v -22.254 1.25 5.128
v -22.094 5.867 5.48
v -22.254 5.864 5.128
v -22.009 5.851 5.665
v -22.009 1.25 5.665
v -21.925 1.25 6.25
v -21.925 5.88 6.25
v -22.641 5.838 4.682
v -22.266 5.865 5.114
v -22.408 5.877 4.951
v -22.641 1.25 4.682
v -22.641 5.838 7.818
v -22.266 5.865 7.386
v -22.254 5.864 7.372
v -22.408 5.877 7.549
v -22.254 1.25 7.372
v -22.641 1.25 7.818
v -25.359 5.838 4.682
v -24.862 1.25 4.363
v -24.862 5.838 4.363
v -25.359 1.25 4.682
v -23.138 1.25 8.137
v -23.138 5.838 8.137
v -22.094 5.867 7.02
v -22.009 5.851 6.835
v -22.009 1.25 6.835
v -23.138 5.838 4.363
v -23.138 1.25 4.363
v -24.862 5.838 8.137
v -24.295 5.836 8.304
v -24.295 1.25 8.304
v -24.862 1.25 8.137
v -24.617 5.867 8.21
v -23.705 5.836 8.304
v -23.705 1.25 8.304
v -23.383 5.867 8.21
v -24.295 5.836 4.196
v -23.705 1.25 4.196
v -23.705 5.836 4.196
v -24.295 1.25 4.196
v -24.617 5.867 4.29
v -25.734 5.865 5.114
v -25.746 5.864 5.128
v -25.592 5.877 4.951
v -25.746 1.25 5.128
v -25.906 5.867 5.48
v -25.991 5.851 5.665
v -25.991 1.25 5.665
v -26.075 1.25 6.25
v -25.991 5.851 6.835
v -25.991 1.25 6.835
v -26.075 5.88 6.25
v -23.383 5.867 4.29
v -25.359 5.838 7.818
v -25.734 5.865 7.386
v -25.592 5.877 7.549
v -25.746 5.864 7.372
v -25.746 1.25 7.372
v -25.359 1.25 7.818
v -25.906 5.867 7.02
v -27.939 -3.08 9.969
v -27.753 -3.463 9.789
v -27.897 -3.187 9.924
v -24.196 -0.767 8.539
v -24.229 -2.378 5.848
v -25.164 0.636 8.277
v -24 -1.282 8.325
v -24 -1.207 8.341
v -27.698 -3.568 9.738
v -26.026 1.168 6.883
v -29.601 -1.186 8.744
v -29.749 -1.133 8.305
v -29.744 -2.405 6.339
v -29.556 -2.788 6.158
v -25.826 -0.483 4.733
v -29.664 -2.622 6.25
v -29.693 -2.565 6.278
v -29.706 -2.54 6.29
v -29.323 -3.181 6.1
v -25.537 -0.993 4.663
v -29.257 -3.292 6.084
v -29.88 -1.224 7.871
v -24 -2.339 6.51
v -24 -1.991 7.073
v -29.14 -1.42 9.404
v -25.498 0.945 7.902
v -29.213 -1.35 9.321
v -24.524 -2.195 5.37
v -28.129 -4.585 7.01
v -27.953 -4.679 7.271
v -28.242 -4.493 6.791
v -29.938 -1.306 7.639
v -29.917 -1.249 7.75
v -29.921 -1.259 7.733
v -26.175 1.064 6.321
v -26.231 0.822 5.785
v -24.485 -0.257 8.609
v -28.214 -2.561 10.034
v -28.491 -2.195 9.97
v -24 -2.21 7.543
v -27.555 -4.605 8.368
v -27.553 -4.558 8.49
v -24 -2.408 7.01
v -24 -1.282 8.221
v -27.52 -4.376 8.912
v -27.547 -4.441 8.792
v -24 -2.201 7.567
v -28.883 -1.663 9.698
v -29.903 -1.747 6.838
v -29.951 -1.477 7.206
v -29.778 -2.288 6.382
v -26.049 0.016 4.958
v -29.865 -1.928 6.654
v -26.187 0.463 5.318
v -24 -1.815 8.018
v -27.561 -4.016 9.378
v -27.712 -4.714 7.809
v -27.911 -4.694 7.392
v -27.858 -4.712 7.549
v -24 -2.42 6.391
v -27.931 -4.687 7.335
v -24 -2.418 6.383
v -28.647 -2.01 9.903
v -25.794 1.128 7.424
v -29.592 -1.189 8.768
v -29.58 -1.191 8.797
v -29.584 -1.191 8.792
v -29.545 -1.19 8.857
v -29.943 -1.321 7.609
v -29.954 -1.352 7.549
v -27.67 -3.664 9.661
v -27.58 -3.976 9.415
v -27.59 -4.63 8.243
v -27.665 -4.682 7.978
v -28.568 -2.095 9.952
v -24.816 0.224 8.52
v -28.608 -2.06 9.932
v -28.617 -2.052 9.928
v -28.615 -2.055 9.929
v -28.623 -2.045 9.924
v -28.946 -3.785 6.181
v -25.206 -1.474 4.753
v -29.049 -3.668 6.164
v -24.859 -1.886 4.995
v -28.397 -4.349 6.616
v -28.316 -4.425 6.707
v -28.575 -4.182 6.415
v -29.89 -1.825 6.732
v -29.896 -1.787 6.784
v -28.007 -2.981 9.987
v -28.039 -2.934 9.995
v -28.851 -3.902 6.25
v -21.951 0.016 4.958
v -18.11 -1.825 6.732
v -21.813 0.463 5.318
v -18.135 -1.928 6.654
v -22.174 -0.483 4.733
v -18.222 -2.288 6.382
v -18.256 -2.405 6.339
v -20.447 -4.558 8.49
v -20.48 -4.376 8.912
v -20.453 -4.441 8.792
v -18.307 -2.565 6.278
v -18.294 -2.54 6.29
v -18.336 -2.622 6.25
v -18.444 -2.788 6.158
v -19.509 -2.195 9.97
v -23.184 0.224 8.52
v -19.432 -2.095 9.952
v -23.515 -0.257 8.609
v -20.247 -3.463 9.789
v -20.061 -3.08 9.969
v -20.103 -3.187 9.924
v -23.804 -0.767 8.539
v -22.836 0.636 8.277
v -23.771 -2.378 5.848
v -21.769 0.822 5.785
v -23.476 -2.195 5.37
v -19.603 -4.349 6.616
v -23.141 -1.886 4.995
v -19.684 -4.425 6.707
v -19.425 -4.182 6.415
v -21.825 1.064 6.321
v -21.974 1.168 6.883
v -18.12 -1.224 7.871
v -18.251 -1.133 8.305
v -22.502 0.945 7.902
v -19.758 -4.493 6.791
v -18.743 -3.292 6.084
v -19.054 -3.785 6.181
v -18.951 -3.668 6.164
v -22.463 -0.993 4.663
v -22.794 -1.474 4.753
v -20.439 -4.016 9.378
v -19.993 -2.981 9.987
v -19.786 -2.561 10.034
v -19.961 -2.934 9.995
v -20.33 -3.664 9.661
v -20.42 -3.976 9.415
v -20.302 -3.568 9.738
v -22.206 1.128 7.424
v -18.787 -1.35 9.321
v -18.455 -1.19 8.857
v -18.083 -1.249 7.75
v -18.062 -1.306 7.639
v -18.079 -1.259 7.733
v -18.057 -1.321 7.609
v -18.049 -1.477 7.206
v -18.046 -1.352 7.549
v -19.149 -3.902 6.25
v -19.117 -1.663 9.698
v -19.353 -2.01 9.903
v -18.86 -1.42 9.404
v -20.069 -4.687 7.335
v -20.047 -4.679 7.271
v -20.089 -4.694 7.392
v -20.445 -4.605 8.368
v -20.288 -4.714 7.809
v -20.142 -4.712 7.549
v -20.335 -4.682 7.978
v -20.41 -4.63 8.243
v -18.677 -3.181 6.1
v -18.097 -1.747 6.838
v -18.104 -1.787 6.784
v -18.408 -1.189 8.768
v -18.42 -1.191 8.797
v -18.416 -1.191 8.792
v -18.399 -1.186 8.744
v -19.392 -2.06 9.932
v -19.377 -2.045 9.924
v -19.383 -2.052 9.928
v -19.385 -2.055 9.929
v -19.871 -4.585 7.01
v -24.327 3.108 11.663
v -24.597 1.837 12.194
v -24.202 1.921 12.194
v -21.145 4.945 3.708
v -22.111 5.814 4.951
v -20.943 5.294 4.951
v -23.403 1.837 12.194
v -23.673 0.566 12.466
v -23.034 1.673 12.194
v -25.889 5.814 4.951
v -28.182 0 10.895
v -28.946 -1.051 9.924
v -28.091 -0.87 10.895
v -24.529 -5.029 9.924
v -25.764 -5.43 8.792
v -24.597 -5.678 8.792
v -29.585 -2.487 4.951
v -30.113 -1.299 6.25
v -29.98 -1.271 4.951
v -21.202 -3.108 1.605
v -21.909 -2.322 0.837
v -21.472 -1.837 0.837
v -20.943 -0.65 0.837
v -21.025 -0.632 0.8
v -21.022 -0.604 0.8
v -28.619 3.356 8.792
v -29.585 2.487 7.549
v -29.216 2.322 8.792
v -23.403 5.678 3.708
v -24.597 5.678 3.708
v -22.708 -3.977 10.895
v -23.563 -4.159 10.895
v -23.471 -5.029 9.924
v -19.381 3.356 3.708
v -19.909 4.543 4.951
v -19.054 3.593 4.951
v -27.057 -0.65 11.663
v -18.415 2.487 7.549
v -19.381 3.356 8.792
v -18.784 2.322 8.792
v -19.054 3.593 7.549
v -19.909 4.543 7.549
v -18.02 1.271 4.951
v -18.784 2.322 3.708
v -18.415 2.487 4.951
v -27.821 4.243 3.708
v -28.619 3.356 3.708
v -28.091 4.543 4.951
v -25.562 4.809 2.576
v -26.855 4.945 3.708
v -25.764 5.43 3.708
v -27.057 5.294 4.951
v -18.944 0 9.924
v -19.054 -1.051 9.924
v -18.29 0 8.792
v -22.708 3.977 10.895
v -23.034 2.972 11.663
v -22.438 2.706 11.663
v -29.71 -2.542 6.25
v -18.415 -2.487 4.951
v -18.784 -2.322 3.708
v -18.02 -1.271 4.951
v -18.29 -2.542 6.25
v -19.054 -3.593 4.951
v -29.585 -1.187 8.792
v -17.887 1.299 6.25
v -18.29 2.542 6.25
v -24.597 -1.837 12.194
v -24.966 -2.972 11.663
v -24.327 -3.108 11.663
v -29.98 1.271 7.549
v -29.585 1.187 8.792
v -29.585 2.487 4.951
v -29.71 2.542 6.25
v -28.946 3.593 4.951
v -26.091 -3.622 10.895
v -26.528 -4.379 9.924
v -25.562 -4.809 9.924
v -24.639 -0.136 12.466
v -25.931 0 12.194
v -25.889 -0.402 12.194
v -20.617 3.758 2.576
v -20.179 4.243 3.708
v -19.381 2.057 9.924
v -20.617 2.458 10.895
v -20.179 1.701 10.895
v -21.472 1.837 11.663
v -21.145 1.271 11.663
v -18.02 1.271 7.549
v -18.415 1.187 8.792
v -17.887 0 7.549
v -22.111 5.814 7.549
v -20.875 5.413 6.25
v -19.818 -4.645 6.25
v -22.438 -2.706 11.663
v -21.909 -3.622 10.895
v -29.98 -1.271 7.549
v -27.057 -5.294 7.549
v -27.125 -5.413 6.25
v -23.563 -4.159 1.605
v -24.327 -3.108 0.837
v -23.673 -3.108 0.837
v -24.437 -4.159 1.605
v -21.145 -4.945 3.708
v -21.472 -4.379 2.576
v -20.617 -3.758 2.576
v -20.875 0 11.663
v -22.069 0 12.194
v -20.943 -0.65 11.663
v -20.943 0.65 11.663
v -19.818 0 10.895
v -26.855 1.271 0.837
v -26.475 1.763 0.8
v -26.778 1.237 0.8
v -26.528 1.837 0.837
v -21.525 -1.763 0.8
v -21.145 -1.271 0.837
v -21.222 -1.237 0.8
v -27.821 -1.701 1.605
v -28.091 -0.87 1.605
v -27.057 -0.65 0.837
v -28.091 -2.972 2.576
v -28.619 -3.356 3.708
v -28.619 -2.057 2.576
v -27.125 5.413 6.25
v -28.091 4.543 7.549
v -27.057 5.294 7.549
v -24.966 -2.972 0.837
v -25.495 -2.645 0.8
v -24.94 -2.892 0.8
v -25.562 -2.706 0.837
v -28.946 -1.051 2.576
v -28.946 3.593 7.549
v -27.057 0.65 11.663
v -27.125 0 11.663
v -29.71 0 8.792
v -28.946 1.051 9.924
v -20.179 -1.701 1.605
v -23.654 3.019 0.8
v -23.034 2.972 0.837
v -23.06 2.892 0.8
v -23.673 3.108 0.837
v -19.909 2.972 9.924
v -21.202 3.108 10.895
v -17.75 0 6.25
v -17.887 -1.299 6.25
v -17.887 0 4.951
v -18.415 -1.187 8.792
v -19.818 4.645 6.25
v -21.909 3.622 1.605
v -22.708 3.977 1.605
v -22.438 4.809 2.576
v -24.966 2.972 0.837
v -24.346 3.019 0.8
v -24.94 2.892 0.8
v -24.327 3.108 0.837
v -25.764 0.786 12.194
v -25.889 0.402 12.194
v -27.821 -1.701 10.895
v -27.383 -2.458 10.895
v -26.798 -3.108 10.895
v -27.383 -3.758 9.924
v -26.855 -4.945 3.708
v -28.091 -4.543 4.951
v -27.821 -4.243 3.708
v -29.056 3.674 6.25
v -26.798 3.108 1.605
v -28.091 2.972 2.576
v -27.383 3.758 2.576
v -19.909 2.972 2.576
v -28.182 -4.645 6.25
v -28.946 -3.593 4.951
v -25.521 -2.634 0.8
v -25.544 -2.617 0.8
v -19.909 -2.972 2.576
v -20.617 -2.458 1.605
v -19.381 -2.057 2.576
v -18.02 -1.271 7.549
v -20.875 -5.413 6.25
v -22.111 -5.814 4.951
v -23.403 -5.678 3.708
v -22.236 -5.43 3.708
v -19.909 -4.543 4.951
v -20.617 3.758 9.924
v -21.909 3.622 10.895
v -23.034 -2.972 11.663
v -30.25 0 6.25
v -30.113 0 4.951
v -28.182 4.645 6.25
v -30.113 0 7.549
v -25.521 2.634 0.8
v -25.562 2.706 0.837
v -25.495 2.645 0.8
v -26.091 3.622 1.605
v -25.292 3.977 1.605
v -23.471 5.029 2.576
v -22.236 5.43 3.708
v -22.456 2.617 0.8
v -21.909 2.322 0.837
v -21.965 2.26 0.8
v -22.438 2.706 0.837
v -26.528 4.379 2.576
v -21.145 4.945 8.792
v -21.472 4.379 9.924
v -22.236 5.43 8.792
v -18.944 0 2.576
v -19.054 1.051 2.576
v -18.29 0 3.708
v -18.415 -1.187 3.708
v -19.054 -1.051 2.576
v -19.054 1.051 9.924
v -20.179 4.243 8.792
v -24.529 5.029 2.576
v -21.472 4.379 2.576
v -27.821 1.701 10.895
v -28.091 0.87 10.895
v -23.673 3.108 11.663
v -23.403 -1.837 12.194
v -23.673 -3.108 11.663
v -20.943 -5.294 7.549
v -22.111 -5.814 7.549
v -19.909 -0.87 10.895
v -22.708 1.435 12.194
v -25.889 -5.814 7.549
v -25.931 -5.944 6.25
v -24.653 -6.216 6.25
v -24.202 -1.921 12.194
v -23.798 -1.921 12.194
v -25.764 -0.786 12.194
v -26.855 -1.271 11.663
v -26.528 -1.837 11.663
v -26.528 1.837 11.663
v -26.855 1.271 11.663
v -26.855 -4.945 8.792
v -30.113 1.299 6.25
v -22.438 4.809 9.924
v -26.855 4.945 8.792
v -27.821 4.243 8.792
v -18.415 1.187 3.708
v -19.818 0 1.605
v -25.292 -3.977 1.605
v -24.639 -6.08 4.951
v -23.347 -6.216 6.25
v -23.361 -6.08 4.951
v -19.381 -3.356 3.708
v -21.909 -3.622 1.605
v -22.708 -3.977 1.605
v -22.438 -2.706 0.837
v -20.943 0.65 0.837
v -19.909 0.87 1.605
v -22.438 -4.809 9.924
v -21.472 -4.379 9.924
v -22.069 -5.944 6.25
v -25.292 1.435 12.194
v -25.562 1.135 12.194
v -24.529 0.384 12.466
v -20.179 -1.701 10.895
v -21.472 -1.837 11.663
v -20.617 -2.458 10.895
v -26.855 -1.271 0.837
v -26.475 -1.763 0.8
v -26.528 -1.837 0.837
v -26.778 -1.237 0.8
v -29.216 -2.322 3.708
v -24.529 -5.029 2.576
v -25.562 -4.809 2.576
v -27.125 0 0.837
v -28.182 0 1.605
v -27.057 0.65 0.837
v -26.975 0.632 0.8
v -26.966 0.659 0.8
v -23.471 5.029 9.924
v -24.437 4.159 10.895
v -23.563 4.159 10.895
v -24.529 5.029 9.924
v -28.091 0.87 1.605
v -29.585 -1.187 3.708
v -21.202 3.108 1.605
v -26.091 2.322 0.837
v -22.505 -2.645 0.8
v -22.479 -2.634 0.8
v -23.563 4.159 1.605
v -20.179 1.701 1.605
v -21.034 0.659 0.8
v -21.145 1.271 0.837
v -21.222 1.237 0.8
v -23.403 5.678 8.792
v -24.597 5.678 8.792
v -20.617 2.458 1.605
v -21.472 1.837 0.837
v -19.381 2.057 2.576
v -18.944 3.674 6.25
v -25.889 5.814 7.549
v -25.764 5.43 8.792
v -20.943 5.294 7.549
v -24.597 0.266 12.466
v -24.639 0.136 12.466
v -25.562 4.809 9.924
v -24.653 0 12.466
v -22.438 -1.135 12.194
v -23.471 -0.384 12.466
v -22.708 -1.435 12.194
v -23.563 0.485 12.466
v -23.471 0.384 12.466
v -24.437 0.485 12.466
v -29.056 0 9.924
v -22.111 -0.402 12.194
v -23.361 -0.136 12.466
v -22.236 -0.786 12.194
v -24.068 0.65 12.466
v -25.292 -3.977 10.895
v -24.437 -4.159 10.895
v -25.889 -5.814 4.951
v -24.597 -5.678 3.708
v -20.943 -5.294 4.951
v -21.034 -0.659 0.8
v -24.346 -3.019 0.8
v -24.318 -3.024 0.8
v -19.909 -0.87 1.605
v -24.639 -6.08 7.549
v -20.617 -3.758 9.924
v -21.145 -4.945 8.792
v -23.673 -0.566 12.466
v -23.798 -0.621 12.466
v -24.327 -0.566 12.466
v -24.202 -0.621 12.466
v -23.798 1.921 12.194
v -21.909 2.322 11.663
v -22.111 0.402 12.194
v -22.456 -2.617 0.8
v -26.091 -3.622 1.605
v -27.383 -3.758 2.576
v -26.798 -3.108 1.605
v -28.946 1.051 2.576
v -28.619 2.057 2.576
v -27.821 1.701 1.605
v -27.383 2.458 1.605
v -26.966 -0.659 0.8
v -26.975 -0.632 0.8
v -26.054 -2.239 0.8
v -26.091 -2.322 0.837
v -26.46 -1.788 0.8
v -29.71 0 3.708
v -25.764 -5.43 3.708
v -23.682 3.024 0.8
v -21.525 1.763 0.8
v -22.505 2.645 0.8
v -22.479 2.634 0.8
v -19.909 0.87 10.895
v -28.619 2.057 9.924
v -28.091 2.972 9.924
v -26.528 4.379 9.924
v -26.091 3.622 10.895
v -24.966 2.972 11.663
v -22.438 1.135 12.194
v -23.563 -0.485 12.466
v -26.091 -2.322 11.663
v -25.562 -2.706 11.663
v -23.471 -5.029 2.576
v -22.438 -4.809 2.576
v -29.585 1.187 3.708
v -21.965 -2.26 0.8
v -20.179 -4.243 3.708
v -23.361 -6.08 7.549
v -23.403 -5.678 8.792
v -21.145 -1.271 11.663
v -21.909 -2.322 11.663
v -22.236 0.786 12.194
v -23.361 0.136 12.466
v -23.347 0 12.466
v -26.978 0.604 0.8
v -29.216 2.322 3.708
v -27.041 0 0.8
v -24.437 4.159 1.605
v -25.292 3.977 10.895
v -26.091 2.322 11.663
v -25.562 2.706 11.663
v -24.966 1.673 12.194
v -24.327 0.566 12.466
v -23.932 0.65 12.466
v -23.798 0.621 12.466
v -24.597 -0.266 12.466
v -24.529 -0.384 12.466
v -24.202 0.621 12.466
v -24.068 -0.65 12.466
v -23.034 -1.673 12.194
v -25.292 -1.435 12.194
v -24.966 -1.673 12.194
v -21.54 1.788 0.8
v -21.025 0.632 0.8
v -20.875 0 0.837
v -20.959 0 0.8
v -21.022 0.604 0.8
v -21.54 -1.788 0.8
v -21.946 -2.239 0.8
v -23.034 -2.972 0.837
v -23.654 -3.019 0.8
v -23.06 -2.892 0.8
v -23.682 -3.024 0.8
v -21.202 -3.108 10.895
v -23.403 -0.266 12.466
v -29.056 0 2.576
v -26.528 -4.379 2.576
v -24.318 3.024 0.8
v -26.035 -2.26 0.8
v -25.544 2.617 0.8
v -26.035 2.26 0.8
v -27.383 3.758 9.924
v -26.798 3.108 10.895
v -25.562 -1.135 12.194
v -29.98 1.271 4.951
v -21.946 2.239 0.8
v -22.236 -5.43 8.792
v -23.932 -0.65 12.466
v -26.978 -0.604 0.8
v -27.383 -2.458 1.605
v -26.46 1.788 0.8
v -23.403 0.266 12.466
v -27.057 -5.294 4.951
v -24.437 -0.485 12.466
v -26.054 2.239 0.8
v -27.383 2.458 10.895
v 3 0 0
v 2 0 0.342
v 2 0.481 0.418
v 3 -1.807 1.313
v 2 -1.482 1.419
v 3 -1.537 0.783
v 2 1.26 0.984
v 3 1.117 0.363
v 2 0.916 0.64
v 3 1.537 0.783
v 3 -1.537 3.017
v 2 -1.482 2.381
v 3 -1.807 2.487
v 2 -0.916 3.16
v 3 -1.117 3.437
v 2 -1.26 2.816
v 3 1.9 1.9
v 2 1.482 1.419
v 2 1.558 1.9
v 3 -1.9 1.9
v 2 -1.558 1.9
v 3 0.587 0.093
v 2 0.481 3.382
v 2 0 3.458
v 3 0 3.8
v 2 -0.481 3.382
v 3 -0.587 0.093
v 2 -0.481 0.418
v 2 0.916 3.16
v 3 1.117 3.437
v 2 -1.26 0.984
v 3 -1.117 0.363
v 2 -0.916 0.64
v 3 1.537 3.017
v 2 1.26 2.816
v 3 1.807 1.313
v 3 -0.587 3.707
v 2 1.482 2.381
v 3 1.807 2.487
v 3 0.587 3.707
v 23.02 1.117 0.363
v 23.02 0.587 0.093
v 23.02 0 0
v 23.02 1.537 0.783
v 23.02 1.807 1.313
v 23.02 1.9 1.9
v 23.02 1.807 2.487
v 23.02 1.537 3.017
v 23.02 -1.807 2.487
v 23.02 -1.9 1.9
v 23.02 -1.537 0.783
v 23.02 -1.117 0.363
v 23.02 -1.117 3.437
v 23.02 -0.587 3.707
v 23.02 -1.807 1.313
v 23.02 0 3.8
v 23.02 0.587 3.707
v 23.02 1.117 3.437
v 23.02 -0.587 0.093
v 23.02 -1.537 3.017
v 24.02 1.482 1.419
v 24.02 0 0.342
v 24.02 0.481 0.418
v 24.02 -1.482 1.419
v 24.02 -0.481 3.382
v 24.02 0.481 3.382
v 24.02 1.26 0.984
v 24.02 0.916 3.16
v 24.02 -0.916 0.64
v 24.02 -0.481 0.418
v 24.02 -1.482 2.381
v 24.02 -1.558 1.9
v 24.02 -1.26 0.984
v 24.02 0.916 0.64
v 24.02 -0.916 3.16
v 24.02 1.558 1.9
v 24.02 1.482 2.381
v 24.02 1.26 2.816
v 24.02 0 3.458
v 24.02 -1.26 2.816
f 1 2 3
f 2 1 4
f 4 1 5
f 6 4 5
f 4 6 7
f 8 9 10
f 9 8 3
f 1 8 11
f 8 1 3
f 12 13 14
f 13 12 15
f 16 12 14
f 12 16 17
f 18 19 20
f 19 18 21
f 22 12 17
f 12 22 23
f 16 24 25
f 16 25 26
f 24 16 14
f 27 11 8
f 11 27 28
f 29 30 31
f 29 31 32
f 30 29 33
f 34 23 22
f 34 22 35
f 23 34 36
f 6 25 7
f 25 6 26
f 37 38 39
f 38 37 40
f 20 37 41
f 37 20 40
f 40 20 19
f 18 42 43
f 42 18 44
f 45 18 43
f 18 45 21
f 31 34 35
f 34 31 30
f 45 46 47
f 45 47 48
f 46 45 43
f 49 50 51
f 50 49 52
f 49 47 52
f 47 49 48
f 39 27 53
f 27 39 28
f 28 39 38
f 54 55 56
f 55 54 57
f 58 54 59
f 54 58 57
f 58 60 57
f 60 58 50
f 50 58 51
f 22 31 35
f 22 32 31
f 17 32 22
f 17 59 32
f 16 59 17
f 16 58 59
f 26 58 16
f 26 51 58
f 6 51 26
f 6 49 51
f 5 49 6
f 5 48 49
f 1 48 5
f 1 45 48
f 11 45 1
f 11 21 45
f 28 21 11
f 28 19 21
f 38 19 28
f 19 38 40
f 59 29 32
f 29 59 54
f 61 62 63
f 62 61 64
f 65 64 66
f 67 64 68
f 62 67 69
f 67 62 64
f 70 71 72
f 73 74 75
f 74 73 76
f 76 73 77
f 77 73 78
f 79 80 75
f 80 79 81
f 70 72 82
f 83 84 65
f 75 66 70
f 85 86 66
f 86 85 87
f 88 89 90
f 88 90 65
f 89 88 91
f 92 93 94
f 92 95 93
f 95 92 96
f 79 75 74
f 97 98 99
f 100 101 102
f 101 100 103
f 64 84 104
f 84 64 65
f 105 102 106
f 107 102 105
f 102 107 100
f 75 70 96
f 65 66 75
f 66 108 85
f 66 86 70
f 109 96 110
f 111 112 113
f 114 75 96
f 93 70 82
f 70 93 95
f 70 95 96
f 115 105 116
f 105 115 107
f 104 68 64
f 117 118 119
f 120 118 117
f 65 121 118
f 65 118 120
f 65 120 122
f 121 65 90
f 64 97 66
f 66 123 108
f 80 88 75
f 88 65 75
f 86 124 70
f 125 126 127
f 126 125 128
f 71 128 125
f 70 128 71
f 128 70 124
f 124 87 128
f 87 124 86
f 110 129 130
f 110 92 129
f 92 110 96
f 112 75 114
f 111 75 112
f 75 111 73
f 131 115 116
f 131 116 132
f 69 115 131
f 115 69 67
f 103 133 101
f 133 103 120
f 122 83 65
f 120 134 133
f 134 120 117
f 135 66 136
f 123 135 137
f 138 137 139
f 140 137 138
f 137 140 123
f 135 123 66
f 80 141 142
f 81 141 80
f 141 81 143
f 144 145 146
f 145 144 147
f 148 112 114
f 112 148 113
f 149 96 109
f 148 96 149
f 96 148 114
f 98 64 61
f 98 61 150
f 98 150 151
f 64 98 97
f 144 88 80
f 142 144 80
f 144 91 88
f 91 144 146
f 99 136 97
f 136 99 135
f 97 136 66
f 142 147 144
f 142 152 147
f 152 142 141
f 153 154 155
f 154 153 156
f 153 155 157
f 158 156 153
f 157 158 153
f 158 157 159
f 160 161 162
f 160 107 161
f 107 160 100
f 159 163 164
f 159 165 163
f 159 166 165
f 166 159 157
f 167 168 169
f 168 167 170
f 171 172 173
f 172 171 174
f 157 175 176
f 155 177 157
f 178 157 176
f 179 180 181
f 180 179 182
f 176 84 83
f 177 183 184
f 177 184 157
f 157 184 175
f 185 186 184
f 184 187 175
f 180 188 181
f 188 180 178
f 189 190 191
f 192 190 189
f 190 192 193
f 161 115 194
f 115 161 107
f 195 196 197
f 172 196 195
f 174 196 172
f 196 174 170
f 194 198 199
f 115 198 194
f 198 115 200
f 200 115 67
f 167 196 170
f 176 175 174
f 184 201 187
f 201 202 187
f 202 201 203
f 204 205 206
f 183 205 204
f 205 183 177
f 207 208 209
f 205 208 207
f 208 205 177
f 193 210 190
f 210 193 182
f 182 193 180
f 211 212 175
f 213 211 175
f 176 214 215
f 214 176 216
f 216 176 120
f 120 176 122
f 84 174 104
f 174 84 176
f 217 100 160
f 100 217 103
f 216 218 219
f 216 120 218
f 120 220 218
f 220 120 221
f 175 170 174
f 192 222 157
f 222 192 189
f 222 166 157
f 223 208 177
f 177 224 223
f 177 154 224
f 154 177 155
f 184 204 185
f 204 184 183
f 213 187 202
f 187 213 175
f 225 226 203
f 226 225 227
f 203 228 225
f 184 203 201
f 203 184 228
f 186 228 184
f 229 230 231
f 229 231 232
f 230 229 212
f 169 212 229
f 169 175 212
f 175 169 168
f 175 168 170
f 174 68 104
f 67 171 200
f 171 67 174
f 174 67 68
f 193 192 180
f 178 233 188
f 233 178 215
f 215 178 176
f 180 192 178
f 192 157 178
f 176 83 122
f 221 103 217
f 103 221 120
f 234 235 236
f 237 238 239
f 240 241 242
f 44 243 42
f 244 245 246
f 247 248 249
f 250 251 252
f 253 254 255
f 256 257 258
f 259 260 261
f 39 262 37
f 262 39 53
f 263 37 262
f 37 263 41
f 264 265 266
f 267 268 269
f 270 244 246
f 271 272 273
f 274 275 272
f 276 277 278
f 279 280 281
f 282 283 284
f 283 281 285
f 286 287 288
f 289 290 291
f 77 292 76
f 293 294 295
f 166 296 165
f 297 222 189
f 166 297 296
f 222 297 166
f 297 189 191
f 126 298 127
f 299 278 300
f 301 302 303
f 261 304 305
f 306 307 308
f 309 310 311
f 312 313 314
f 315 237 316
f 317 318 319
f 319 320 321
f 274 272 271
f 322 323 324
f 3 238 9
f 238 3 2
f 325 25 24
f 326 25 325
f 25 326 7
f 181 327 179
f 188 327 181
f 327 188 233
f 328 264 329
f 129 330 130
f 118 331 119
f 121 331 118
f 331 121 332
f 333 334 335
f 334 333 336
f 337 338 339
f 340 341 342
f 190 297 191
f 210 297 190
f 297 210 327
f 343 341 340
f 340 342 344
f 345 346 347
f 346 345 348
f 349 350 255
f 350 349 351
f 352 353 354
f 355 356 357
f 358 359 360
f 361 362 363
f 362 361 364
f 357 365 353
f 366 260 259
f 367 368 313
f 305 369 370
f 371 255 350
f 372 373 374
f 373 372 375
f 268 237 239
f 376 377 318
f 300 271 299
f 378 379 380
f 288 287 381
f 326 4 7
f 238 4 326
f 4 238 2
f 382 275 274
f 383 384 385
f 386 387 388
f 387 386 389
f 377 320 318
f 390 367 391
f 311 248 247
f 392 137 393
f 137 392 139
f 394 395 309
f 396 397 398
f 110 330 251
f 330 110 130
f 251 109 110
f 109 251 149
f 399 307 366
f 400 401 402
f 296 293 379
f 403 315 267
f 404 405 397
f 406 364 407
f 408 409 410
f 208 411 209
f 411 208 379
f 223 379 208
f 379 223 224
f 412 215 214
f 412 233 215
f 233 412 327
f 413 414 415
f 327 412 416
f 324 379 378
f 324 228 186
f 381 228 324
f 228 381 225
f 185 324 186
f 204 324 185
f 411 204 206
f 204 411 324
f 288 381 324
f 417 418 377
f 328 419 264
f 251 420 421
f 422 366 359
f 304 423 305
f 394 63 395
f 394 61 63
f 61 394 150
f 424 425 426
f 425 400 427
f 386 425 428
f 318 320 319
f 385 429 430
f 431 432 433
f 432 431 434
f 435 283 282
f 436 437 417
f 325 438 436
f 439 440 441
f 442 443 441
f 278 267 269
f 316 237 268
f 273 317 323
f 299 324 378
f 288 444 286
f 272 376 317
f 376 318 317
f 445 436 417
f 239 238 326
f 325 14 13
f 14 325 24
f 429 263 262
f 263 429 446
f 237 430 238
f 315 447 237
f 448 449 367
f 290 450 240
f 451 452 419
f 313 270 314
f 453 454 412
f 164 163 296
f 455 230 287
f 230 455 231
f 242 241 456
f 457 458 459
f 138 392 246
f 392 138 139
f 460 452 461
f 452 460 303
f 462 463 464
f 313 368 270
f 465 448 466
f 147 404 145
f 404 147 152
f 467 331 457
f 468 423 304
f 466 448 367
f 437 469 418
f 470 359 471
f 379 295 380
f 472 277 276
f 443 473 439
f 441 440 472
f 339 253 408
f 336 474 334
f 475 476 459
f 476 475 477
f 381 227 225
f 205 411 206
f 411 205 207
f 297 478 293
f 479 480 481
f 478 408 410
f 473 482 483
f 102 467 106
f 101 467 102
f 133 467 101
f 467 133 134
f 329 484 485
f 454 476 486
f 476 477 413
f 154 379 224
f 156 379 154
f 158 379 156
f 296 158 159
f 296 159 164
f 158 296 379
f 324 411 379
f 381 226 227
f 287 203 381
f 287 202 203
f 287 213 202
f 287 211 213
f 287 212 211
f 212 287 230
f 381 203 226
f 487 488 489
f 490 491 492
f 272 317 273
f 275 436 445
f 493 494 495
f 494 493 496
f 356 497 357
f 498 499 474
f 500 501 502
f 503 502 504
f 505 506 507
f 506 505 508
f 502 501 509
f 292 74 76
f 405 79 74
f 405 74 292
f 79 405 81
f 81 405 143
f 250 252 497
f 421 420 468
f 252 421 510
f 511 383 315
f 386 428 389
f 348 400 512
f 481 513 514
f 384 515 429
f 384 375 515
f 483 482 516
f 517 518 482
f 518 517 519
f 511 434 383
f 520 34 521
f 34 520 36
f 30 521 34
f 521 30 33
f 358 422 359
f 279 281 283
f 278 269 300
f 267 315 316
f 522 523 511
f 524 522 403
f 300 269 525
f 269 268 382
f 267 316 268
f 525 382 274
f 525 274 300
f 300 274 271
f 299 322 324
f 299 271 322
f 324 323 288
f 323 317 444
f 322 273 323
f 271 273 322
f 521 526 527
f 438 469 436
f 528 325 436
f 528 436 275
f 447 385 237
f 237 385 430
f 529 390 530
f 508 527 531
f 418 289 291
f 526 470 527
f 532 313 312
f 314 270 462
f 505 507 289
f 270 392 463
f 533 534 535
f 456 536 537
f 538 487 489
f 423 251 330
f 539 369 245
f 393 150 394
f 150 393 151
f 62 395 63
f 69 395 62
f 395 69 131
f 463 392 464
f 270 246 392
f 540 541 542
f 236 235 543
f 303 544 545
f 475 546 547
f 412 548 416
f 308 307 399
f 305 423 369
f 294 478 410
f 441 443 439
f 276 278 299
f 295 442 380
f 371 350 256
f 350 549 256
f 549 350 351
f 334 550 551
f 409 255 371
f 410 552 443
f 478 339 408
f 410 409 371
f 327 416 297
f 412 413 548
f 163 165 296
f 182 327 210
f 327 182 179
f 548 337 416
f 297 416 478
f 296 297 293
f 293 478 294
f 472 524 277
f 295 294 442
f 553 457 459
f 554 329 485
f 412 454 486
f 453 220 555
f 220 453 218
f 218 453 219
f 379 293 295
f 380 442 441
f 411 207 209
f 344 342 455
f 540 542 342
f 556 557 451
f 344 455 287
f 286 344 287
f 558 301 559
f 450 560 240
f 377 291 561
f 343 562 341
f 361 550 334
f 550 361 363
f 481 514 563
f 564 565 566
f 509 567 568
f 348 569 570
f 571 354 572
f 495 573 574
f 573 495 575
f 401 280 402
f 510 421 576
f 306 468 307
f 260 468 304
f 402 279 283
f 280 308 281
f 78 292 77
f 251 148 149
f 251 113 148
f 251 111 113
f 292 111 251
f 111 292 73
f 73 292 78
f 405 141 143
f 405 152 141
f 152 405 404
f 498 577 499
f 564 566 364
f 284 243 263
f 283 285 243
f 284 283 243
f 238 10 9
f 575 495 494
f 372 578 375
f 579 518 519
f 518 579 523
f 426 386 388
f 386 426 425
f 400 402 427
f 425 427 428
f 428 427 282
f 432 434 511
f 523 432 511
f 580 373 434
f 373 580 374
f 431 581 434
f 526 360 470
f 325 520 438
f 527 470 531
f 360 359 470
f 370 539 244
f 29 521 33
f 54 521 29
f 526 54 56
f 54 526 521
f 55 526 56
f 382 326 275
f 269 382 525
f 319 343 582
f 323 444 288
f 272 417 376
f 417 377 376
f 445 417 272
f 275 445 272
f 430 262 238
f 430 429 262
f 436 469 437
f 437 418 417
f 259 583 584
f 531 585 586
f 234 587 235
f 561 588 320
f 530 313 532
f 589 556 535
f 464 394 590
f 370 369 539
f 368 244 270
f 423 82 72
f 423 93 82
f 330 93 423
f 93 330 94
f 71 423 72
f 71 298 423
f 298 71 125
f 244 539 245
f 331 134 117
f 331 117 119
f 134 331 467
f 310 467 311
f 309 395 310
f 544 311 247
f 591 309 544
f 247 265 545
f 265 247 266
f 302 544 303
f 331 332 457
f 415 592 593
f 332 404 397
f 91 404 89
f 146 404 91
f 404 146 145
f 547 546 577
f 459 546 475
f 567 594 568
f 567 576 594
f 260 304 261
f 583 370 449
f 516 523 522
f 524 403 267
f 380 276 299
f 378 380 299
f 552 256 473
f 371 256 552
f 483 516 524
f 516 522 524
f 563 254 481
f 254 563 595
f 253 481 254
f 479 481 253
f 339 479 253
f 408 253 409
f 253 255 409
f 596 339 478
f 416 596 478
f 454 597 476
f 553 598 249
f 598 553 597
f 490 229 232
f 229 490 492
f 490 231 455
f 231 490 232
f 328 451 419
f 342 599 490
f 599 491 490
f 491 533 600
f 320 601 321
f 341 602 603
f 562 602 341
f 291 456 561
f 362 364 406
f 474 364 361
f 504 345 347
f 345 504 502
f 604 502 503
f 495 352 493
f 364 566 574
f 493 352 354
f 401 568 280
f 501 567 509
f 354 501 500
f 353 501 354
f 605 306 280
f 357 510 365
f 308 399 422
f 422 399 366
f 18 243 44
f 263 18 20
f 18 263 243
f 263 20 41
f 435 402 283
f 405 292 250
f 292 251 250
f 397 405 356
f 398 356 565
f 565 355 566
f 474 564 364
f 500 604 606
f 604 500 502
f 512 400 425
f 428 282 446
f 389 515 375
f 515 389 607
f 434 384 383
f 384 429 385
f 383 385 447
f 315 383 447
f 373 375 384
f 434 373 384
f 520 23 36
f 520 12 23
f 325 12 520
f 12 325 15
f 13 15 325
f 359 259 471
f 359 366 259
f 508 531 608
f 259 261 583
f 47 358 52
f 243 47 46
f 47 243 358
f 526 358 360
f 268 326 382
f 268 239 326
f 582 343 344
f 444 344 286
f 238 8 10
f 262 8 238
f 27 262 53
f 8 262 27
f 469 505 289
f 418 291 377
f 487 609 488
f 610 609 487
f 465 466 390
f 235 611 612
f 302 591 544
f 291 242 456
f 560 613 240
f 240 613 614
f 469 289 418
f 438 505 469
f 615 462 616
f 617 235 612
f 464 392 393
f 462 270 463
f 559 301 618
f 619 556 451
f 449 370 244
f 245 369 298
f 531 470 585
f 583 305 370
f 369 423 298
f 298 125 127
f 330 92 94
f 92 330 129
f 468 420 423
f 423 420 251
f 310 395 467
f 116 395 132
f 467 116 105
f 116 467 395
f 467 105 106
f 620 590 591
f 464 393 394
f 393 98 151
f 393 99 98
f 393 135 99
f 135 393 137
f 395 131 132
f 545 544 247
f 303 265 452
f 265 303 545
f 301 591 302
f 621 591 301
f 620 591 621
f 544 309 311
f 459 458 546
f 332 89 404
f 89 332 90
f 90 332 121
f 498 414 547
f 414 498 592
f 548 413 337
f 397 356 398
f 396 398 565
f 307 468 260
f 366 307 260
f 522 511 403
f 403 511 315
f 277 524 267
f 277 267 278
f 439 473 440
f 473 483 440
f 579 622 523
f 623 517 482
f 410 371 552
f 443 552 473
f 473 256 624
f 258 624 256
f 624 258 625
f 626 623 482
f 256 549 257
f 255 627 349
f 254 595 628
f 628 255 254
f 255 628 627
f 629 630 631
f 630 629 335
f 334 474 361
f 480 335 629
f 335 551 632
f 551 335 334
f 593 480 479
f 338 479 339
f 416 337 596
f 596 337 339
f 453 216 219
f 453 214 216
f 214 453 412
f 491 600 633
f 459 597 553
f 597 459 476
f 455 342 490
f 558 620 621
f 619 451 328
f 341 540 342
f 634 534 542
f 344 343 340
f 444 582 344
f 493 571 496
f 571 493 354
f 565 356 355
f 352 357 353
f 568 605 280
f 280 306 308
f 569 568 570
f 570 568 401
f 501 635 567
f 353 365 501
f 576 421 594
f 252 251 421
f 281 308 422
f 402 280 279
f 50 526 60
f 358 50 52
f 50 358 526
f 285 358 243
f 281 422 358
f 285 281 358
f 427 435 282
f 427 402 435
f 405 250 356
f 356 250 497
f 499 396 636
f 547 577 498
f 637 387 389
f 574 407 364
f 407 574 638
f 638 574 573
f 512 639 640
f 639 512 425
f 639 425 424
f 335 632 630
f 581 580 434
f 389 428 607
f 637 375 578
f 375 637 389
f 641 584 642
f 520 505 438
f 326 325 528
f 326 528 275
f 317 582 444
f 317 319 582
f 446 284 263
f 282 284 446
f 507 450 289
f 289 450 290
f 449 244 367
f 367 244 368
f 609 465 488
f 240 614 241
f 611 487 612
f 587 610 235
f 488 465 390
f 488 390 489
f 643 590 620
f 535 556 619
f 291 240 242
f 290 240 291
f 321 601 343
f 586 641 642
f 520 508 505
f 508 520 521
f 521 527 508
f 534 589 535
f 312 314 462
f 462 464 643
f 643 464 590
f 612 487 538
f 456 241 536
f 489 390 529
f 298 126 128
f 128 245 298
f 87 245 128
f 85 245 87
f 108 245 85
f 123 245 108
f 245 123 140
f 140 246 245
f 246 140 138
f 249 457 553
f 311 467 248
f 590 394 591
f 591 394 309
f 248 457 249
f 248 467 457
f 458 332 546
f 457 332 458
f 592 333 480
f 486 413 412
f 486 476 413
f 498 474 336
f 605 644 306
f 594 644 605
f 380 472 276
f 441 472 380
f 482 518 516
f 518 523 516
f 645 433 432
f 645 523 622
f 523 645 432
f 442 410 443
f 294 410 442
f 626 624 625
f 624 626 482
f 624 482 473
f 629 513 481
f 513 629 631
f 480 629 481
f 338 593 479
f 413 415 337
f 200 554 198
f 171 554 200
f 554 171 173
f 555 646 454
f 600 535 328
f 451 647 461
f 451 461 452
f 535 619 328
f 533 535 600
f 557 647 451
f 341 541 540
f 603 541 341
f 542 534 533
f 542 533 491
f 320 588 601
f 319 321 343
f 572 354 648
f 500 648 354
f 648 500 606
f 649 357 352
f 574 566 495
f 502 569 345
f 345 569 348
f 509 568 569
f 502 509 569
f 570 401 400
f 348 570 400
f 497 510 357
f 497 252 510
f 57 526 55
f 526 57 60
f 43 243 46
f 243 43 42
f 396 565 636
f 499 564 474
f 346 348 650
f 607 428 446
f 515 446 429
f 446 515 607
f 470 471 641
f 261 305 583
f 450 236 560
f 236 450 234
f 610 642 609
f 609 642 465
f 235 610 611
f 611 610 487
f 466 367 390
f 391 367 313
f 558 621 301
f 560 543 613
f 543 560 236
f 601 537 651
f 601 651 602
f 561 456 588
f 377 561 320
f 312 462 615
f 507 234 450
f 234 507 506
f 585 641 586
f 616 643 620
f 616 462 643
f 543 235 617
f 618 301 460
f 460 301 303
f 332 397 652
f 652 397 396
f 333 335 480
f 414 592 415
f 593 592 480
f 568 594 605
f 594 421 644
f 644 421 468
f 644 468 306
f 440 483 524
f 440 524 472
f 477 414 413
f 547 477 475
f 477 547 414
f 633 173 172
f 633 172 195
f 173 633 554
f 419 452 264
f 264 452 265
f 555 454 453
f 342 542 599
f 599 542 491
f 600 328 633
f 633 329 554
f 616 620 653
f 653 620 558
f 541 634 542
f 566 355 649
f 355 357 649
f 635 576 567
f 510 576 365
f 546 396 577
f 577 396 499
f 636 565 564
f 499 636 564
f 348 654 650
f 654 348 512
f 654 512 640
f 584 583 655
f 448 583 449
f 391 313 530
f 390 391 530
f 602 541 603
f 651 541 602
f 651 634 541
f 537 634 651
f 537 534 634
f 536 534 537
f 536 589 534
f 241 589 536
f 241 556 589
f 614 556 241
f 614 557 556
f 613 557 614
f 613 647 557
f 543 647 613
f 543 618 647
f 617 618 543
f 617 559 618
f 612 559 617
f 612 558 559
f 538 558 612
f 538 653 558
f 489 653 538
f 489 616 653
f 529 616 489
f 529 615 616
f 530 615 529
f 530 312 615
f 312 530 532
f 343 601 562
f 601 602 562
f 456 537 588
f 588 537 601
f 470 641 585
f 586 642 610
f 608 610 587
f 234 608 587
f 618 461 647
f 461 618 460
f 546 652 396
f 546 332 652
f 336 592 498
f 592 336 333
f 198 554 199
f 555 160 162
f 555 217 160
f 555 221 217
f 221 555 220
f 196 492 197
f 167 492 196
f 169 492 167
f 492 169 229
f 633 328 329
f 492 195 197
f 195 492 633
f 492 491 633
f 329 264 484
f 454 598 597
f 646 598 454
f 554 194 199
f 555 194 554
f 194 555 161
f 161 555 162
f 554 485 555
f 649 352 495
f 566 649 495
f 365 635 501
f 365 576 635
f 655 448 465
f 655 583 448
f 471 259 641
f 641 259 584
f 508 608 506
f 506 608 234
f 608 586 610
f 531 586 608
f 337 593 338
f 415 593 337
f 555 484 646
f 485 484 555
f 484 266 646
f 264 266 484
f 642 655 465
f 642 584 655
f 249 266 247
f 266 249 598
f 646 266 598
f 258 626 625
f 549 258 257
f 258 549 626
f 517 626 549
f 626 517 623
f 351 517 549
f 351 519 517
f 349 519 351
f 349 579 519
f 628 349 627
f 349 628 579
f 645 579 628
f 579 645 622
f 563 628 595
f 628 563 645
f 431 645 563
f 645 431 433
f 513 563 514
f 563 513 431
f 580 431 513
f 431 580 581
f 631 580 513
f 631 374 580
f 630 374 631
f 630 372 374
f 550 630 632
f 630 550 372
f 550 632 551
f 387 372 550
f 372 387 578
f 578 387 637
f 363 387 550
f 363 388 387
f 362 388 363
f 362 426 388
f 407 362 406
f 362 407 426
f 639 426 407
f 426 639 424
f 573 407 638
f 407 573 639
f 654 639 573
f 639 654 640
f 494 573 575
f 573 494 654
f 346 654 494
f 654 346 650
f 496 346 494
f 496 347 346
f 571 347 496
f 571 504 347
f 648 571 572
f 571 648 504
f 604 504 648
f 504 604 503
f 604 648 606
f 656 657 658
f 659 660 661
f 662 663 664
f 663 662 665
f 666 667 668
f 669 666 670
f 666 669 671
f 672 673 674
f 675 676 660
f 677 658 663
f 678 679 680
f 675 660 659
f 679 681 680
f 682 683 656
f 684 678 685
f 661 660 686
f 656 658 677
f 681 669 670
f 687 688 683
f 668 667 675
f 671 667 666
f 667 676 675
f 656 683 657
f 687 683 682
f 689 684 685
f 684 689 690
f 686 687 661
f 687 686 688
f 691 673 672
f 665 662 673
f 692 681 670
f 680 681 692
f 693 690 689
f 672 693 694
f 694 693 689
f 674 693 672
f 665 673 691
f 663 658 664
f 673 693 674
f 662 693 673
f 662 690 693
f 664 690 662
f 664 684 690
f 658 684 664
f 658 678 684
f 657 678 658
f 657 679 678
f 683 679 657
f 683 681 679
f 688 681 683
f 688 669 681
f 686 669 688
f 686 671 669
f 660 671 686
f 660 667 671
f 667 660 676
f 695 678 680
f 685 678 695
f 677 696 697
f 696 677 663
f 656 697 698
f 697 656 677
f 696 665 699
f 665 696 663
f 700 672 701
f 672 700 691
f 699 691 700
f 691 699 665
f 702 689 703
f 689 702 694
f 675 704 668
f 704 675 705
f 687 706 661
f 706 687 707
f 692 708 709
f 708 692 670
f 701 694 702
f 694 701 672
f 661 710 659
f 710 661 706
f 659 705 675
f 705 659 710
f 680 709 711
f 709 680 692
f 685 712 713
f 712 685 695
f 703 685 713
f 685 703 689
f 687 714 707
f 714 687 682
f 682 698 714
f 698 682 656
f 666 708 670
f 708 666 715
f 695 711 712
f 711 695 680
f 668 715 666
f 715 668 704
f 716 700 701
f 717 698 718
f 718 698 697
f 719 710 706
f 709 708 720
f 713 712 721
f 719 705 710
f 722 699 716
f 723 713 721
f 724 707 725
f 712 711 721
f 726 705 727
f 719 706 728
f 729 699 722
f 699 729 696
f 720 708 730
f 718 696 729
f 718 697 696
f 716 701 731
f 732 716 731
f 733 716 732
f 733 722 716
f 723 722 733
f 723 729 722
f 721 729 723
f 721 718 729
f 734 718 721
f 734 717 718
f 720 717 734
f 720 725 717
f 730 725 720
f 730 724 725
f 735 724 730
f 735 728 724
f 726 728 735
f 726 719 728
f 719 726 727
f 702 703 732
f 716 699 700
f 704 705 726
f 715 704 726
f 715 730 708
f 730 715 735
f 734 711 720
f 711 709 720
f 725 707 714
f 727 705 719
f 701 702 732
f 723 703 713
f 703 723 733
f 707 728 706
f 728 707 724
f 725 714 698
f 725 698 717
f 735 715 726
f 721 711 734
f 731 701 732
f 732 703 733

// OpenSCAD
// ============================================
//  可拆装足球棒球模型
//  Printable ball-and-stick soccer ball kit
//
//  足球几何：截角二十面体
//  需要零件：60 个三孔球节点 + 90 根等长棒
//
//  模式：
//  - assembled_preview：组装完成后的足球骨架
//  - kit_preview：一个三孔球 + 一根棒，方便看配件
//  - print_all_parts：排出全部 60 个球和 90 根棒
//  - single_ball / single_rod：单独导出一个零件
// ============================================

$fn = 30;

/* [显示模式] */
view_mode = "kit_preview";  // ["assembled_preview":组装预览, "kit_preview":配件预览, "print_all_parts":全部配件排版, "single_ball":单个球, "single_rod":单根棒]

/* [整体尺寸] */
outer_radius = 62;          // 球节点中心到模型中心的半径
ball_diameter = 12.5;       // 球节点直径
rod_diameter = 3.8;         // 棒直径

/* [插接参数] */
socket_clearance = 0.35;    // 孔径 = 棒直径 + 这个余量，FDM 建议 0.25~0.45
socket_depth = 5.0;         // 每根棒插入球里的深度
rod_end_gap = 0.25;         // 每端预留一点空隙，避免插到底后顶死

/* [零件打印辅助] */
add_ball_print_flat = true; // 给单独打印的球切一个很浅的底平面
ball_flat_height = 0.8;     // 底部削平高度
rod_print_orientation = "vertical"; // ["vertical":竖排棒, "horizontal":横放棒]

/* [排版参数] */
parts_show_identical_balls = true; // true：排版里所有球用同一个三孔节点；实际可打印 1 个后复制 60 份
sample_ball_index = 0;             // 展示哪个顶点的孔方向
parts_ball_spacing = 19;
parts_rod_spacing = 7;
parts_rod_cols = 15;

/* [组装预览辅助] */
lift_to_plate = true;
add_preview_base = false;
assembled_show_sockets = false; // true 会显示每个球的真实孔，但 60 个球布尔会明显变慢
preview_base_diameter = 92;
preview_base_height = 3.0;
preview_post_diameter = 5.0;

phi = (1 + sqrt(5)) / 2;
raw_radius = sqrt(1 + 9 * phi * phi);
raw_edge_length = 2;
edge_tolerance_ratio = 0.03;
football_ball_count = 60;
football_rod_count = 90;

// ---------- 基础向量 ----------

function dist(a, b) =
    sqrt(
        pow(a[0] - b[0], 2) +
        pow(a[1] - b[1], 2) +
        pow(a[2] - b[2], 2)
    );

function v_add(a, b) = [a[0] + b[0], a[1] + b[1], a[2] + b[2]];
function v_sub(a, b) = [a[0] - b[0], a[1] - b[1], a[2] - b[2]];
function v_mul(a, s) = [a[0] * s, a[1] * s, a[2] * s];
function v_len(a) = sqrt(a[0] * a[0] + a[1] * a[1] + a[2] * a[2]);
function v_unit(a) = let(l = v_len(a)) [a[0] / l, a[1] / l, a[2] / l];
function unit_between(a, b) = v_unit(v_sub(b, a));

function scale_point(p, s) = [p[0] * s, p[1] * s, p[2] * s];
function scale_points(points, s) = [for (p = points) scale_point(p, s)];
function min_z(points) = min([for (p = points) p[2]]);

// 偶置换：(a,b,c), (b,c,a), (c,a,b)
function even_perms(v) = [
    [v[0], v[1], v[2]],
    [v[1], v[2], v[0]],
    [v[2], v[0], v[1]]
];

// 截角二十面体标准坐标，原始边长为 2，共 60 个顶点。
function football_raw_vertices() =
    concat(
        [
            for (s1 = [-1, 1])
                for (s2 = [-1, 1])
                    for (p = even_perms([0, s1 * 1, s2 * 3 * phi]))
                        p
        ],
        [
            for (s1 = [-1, 1])
                for (s2 = [-1, 1])
                    for (s3 = [-1, 1])
                        for (p = even_perms([s1 * 1, s2 * (2 + phi), s3 * 2 * phi]))
                            p
        ],
        [
            for (s1 = [-1, 1])
                for (s2 = [-1, 1])
                    for (s3 = [-1, 1])
                        for (p = even_perms([s1 * phi, s2 * 2, s3 * (2 * phi + 1)]))
                            p
        ]
    );

function football_scale() = outer_radius / raw_radius;
function football_vertices() = scale_points(football_raw_vertices(), football_scale());
function edge_length() = raw_edge_length * football_scale();
function ball_radius() = ball_diameter / 2;
function socket_diameter() = rod_diameter + socket_clearance;
function socket_inner_offset() = ball_radius() - socket_depth + rod_end_gap;
function rod_part_length() = edge_length() - 2 * socket_inner_offset();

// ---------- 通用圆柱方向 ----------

module cylinder_between(p1, p2, d, fn_count = 22) {
    v = v_sub(p2, p1);
    l = v_len(v);

    translate(p1)
        if (abs(v[0]) < 0.001 && abs(v[1]) < 0.001)
            rotate([v[2] < 0 ? 180 : 0, 0, 0])
                cylinder(d = d, h = l, $fn = fn_count);
        else
            rotate(a = acos(v[2] / l), v = [-v[1], v[0], 0])
                cylinder(d = d, h = l, $fn = fn_count);
}

// ---------- 可打印组件 ----------

module socket_hole(center, dir) {
    p_inner = v_add(center, v_mul(dir, ball_radius() - socket_depth));
    p_outer = v_add(center, v_mul(dir, ball_radius() + 0.9));

    cylinder_between(p_inner, p_outer, socket_diameter(), 22);
}

module bottom_flat_cut(center) {
    top_z = center[2] - ball_radius() + ball_flat_height;

    translate([center[0], center[1], top_z - 20])
        cube([ball_diameter * 2.2, ball_diameter * 2.2, 40], center = true);
}

module connector_ball(vertex_index = 0, center = [0, 0, 0], points = football_vertices(), print_flat = false) {
    source = points[vertex_index];
    tolerance = edge_length() * edge_tolerance_ratio;

    difference() {
        translate(center)
            sphere(d = ball_diameter, $fn = 30);

        for (j = [0 : len(points) - 1])
            if (vertex_index != j && abs(dist(source, points[j]) - edge_length()) < tolerance)
                socket_hole(center, unit_between(source, points[j]));

        if (print_flat)
            bottom_flat_cut(center);
    }
}

module rod_along_z(length = rod_part_length()) {
    chamfer = min(1.0, length / 5);

    union() {
        cylinder(d1 = rod_diameter * 0.82, d2 = rod_diameter, h = chamfer, $fn = 20);

        translate([0, 0, chamfer])
            cylinder(d = rod_diameter, h = length - chamfer * 2, $fn = 20);

        translate([0, 0, length - chamfer])
            cylinder(d1 = rod_diameter, d2 = rod_diameter * 0.82, h = chamfer, $fn = 20);
    }
}

module rod_horizontal(length = rod_part_length()) {
    translate([0, 0, rod_diameter / 2])
        rotate([0, 90, 0])
            rod_along_z(length);
}

module rod_for_print(length = rod_part_length()) {
    if (rod_print_orientation == "horizontal")
        rod_horizontal(length);
    else
        rod_along_z(length);
}

// ---------- 组装预览 ----------

module assembled_rod(p1, p2) {
    dir = unit_between(p1, p2);
    p_start = v_add(p1, v_mul(dir, socket_inner_offset()));
    p_end = v_add(p2, v_mul(dir, -socket_inner_offset()));

    cylinder_between(p_start, p_end, rod_diameter, 20);
}

module all_assembled_rods(points) {
    tolerance = edge_length() * edge_tolerance_ratio;

    for (i = [0 : len(points) - 2])
        for (j = [i + 1 : len(points) - 1])
            if (abs(dist(points[i], points[j]) - edge_length()) < tolerance)
                assembled_rod(points[i], points[j]);
}

module all_connector_balls(points, raw_points) {
    for (i = [0 : len(points) - 1])
        if (assembled_show_sockets)
            connector_ball(i, points[i], raw_points, false);
        else
            translate(points[i])
                sphere(d = ball_diameter, $fn = 24);
}

module preview_base(z_offset) {
    if (add_preview_base) {
        translate([0, 0, preview_base_height / 2])
            cylinder(d = preview_base_diameter, h = preview_base_height, center = true, $fn = 48);

        translate([0, 0, preview_base_height])
            cylinder(
                d1 = preview_base_diameter * 0.34,
                d2 = preview_post_diameter,
                h = z_offset - preview_base_height,
                $fn = 24
            );
    }
}

module assembled_preview() {
    raw_points = football_vertices();
    z_offset = lift_to_plate ? (-min_z(raw_points) + ball_radius() + (add_preview_base ? preview_base_height : 0)) : 0;
    points = [for (p = raw_points) [p[0], p[1], p[2] + z_offset]];

    union() {
        preview_base(z_offset);
        all_assembled_rods(points);
        all_connector_balls(points, raw_points);
    }
}

// ---------- 配件预览 / 排版 ----------

module kit_preview() {
    points = football_vertices();

    union() {
        translate([-24, 0, ball_radius()])
            connector_ball(sample_ball_index, [0, 0, 0], points, add_ball_print_flat);

        translate([2, 0, 0])
            rod_horizontal(rod_part_length());
    }
}

module print_all_parts() {
    points = football_vertices();
    ball_cols = 10;
    ball_rows = ceil(football_ball_count / ball_cols);
    rod_y0 = ball_rows * parts_ball_spacing + 18;
    rod_step_y = rod_print_orientation == "horizontal" ? parts_rod_spacing * 1.4 : parts_rod_spacing;
    rod_step_x = rod_print_orientation == "horizontal" ? rod_part_length() + 6 : parts_rod_spacing;

    union() {
        for (i = [0 : football_ball_count - 1]) {
            idx = parts_show_identical_balls ? sample_ball_index : i;
            x = (i % ball_cols) * parts_ball_spacing - (ball_cols - 1) * parts_ball_spacing / 2;
            y = floor(i / ball_cols) * parts_ball_spacing;

            translate([x, y, ball_radius()])
                connector_ball(idx, [0, 0, 0], points, add_ball_print_flat);
        }

        for (k = [0 : football_rod_count - 1]) {
            x = (k % parts_rod_cols) * rod_step_x - (parts_rod_cols - 1) * rod_step_x / 2;
            y = rod_y0 + floor(k / parts_rod_cols) * rod_step_y;

            translate([x, y, 0])
                rod_for_print(rod_part_length());
        }
    }
}

module single_ball() {
    points = football_vertices();

    translate([0, 0, ball_radius()])
        connector_ball(sample_ball_index, [0, 0, 0], points, add_ball_print_flat);
}

module single_rod() {
    rod_for_print(rod_part_length());
}

// ---------- 输出 ----------

echo("soccer ball = truncated icosahedron");
echo(str("balls = ", football_ball_count, " pcs"));
echo(str("rods = ", football_rod_count, " pcs"));
echo(str("node degree = 3 holes per ball"));
echo(str("edge_length(center-to-center) = ", edge_length(), " mm"));
echo(str("rod_length = ", rod_part_length(), " mm"));
echo(str("socket_diameter = ", socket_diameter(), " mm"));
echo(str("socket_depth = ", socket_depth, " mm"));

if (view_mode == "assembled_preview")
    assembled_preview();
else if (view_mode == "print_all_parts")
    print_all_parts();
else if (view_mode == "single_ball")
    single_ball();
else if (view_mode == "single_rod")
    single_rod();
else
    kit_preview();
